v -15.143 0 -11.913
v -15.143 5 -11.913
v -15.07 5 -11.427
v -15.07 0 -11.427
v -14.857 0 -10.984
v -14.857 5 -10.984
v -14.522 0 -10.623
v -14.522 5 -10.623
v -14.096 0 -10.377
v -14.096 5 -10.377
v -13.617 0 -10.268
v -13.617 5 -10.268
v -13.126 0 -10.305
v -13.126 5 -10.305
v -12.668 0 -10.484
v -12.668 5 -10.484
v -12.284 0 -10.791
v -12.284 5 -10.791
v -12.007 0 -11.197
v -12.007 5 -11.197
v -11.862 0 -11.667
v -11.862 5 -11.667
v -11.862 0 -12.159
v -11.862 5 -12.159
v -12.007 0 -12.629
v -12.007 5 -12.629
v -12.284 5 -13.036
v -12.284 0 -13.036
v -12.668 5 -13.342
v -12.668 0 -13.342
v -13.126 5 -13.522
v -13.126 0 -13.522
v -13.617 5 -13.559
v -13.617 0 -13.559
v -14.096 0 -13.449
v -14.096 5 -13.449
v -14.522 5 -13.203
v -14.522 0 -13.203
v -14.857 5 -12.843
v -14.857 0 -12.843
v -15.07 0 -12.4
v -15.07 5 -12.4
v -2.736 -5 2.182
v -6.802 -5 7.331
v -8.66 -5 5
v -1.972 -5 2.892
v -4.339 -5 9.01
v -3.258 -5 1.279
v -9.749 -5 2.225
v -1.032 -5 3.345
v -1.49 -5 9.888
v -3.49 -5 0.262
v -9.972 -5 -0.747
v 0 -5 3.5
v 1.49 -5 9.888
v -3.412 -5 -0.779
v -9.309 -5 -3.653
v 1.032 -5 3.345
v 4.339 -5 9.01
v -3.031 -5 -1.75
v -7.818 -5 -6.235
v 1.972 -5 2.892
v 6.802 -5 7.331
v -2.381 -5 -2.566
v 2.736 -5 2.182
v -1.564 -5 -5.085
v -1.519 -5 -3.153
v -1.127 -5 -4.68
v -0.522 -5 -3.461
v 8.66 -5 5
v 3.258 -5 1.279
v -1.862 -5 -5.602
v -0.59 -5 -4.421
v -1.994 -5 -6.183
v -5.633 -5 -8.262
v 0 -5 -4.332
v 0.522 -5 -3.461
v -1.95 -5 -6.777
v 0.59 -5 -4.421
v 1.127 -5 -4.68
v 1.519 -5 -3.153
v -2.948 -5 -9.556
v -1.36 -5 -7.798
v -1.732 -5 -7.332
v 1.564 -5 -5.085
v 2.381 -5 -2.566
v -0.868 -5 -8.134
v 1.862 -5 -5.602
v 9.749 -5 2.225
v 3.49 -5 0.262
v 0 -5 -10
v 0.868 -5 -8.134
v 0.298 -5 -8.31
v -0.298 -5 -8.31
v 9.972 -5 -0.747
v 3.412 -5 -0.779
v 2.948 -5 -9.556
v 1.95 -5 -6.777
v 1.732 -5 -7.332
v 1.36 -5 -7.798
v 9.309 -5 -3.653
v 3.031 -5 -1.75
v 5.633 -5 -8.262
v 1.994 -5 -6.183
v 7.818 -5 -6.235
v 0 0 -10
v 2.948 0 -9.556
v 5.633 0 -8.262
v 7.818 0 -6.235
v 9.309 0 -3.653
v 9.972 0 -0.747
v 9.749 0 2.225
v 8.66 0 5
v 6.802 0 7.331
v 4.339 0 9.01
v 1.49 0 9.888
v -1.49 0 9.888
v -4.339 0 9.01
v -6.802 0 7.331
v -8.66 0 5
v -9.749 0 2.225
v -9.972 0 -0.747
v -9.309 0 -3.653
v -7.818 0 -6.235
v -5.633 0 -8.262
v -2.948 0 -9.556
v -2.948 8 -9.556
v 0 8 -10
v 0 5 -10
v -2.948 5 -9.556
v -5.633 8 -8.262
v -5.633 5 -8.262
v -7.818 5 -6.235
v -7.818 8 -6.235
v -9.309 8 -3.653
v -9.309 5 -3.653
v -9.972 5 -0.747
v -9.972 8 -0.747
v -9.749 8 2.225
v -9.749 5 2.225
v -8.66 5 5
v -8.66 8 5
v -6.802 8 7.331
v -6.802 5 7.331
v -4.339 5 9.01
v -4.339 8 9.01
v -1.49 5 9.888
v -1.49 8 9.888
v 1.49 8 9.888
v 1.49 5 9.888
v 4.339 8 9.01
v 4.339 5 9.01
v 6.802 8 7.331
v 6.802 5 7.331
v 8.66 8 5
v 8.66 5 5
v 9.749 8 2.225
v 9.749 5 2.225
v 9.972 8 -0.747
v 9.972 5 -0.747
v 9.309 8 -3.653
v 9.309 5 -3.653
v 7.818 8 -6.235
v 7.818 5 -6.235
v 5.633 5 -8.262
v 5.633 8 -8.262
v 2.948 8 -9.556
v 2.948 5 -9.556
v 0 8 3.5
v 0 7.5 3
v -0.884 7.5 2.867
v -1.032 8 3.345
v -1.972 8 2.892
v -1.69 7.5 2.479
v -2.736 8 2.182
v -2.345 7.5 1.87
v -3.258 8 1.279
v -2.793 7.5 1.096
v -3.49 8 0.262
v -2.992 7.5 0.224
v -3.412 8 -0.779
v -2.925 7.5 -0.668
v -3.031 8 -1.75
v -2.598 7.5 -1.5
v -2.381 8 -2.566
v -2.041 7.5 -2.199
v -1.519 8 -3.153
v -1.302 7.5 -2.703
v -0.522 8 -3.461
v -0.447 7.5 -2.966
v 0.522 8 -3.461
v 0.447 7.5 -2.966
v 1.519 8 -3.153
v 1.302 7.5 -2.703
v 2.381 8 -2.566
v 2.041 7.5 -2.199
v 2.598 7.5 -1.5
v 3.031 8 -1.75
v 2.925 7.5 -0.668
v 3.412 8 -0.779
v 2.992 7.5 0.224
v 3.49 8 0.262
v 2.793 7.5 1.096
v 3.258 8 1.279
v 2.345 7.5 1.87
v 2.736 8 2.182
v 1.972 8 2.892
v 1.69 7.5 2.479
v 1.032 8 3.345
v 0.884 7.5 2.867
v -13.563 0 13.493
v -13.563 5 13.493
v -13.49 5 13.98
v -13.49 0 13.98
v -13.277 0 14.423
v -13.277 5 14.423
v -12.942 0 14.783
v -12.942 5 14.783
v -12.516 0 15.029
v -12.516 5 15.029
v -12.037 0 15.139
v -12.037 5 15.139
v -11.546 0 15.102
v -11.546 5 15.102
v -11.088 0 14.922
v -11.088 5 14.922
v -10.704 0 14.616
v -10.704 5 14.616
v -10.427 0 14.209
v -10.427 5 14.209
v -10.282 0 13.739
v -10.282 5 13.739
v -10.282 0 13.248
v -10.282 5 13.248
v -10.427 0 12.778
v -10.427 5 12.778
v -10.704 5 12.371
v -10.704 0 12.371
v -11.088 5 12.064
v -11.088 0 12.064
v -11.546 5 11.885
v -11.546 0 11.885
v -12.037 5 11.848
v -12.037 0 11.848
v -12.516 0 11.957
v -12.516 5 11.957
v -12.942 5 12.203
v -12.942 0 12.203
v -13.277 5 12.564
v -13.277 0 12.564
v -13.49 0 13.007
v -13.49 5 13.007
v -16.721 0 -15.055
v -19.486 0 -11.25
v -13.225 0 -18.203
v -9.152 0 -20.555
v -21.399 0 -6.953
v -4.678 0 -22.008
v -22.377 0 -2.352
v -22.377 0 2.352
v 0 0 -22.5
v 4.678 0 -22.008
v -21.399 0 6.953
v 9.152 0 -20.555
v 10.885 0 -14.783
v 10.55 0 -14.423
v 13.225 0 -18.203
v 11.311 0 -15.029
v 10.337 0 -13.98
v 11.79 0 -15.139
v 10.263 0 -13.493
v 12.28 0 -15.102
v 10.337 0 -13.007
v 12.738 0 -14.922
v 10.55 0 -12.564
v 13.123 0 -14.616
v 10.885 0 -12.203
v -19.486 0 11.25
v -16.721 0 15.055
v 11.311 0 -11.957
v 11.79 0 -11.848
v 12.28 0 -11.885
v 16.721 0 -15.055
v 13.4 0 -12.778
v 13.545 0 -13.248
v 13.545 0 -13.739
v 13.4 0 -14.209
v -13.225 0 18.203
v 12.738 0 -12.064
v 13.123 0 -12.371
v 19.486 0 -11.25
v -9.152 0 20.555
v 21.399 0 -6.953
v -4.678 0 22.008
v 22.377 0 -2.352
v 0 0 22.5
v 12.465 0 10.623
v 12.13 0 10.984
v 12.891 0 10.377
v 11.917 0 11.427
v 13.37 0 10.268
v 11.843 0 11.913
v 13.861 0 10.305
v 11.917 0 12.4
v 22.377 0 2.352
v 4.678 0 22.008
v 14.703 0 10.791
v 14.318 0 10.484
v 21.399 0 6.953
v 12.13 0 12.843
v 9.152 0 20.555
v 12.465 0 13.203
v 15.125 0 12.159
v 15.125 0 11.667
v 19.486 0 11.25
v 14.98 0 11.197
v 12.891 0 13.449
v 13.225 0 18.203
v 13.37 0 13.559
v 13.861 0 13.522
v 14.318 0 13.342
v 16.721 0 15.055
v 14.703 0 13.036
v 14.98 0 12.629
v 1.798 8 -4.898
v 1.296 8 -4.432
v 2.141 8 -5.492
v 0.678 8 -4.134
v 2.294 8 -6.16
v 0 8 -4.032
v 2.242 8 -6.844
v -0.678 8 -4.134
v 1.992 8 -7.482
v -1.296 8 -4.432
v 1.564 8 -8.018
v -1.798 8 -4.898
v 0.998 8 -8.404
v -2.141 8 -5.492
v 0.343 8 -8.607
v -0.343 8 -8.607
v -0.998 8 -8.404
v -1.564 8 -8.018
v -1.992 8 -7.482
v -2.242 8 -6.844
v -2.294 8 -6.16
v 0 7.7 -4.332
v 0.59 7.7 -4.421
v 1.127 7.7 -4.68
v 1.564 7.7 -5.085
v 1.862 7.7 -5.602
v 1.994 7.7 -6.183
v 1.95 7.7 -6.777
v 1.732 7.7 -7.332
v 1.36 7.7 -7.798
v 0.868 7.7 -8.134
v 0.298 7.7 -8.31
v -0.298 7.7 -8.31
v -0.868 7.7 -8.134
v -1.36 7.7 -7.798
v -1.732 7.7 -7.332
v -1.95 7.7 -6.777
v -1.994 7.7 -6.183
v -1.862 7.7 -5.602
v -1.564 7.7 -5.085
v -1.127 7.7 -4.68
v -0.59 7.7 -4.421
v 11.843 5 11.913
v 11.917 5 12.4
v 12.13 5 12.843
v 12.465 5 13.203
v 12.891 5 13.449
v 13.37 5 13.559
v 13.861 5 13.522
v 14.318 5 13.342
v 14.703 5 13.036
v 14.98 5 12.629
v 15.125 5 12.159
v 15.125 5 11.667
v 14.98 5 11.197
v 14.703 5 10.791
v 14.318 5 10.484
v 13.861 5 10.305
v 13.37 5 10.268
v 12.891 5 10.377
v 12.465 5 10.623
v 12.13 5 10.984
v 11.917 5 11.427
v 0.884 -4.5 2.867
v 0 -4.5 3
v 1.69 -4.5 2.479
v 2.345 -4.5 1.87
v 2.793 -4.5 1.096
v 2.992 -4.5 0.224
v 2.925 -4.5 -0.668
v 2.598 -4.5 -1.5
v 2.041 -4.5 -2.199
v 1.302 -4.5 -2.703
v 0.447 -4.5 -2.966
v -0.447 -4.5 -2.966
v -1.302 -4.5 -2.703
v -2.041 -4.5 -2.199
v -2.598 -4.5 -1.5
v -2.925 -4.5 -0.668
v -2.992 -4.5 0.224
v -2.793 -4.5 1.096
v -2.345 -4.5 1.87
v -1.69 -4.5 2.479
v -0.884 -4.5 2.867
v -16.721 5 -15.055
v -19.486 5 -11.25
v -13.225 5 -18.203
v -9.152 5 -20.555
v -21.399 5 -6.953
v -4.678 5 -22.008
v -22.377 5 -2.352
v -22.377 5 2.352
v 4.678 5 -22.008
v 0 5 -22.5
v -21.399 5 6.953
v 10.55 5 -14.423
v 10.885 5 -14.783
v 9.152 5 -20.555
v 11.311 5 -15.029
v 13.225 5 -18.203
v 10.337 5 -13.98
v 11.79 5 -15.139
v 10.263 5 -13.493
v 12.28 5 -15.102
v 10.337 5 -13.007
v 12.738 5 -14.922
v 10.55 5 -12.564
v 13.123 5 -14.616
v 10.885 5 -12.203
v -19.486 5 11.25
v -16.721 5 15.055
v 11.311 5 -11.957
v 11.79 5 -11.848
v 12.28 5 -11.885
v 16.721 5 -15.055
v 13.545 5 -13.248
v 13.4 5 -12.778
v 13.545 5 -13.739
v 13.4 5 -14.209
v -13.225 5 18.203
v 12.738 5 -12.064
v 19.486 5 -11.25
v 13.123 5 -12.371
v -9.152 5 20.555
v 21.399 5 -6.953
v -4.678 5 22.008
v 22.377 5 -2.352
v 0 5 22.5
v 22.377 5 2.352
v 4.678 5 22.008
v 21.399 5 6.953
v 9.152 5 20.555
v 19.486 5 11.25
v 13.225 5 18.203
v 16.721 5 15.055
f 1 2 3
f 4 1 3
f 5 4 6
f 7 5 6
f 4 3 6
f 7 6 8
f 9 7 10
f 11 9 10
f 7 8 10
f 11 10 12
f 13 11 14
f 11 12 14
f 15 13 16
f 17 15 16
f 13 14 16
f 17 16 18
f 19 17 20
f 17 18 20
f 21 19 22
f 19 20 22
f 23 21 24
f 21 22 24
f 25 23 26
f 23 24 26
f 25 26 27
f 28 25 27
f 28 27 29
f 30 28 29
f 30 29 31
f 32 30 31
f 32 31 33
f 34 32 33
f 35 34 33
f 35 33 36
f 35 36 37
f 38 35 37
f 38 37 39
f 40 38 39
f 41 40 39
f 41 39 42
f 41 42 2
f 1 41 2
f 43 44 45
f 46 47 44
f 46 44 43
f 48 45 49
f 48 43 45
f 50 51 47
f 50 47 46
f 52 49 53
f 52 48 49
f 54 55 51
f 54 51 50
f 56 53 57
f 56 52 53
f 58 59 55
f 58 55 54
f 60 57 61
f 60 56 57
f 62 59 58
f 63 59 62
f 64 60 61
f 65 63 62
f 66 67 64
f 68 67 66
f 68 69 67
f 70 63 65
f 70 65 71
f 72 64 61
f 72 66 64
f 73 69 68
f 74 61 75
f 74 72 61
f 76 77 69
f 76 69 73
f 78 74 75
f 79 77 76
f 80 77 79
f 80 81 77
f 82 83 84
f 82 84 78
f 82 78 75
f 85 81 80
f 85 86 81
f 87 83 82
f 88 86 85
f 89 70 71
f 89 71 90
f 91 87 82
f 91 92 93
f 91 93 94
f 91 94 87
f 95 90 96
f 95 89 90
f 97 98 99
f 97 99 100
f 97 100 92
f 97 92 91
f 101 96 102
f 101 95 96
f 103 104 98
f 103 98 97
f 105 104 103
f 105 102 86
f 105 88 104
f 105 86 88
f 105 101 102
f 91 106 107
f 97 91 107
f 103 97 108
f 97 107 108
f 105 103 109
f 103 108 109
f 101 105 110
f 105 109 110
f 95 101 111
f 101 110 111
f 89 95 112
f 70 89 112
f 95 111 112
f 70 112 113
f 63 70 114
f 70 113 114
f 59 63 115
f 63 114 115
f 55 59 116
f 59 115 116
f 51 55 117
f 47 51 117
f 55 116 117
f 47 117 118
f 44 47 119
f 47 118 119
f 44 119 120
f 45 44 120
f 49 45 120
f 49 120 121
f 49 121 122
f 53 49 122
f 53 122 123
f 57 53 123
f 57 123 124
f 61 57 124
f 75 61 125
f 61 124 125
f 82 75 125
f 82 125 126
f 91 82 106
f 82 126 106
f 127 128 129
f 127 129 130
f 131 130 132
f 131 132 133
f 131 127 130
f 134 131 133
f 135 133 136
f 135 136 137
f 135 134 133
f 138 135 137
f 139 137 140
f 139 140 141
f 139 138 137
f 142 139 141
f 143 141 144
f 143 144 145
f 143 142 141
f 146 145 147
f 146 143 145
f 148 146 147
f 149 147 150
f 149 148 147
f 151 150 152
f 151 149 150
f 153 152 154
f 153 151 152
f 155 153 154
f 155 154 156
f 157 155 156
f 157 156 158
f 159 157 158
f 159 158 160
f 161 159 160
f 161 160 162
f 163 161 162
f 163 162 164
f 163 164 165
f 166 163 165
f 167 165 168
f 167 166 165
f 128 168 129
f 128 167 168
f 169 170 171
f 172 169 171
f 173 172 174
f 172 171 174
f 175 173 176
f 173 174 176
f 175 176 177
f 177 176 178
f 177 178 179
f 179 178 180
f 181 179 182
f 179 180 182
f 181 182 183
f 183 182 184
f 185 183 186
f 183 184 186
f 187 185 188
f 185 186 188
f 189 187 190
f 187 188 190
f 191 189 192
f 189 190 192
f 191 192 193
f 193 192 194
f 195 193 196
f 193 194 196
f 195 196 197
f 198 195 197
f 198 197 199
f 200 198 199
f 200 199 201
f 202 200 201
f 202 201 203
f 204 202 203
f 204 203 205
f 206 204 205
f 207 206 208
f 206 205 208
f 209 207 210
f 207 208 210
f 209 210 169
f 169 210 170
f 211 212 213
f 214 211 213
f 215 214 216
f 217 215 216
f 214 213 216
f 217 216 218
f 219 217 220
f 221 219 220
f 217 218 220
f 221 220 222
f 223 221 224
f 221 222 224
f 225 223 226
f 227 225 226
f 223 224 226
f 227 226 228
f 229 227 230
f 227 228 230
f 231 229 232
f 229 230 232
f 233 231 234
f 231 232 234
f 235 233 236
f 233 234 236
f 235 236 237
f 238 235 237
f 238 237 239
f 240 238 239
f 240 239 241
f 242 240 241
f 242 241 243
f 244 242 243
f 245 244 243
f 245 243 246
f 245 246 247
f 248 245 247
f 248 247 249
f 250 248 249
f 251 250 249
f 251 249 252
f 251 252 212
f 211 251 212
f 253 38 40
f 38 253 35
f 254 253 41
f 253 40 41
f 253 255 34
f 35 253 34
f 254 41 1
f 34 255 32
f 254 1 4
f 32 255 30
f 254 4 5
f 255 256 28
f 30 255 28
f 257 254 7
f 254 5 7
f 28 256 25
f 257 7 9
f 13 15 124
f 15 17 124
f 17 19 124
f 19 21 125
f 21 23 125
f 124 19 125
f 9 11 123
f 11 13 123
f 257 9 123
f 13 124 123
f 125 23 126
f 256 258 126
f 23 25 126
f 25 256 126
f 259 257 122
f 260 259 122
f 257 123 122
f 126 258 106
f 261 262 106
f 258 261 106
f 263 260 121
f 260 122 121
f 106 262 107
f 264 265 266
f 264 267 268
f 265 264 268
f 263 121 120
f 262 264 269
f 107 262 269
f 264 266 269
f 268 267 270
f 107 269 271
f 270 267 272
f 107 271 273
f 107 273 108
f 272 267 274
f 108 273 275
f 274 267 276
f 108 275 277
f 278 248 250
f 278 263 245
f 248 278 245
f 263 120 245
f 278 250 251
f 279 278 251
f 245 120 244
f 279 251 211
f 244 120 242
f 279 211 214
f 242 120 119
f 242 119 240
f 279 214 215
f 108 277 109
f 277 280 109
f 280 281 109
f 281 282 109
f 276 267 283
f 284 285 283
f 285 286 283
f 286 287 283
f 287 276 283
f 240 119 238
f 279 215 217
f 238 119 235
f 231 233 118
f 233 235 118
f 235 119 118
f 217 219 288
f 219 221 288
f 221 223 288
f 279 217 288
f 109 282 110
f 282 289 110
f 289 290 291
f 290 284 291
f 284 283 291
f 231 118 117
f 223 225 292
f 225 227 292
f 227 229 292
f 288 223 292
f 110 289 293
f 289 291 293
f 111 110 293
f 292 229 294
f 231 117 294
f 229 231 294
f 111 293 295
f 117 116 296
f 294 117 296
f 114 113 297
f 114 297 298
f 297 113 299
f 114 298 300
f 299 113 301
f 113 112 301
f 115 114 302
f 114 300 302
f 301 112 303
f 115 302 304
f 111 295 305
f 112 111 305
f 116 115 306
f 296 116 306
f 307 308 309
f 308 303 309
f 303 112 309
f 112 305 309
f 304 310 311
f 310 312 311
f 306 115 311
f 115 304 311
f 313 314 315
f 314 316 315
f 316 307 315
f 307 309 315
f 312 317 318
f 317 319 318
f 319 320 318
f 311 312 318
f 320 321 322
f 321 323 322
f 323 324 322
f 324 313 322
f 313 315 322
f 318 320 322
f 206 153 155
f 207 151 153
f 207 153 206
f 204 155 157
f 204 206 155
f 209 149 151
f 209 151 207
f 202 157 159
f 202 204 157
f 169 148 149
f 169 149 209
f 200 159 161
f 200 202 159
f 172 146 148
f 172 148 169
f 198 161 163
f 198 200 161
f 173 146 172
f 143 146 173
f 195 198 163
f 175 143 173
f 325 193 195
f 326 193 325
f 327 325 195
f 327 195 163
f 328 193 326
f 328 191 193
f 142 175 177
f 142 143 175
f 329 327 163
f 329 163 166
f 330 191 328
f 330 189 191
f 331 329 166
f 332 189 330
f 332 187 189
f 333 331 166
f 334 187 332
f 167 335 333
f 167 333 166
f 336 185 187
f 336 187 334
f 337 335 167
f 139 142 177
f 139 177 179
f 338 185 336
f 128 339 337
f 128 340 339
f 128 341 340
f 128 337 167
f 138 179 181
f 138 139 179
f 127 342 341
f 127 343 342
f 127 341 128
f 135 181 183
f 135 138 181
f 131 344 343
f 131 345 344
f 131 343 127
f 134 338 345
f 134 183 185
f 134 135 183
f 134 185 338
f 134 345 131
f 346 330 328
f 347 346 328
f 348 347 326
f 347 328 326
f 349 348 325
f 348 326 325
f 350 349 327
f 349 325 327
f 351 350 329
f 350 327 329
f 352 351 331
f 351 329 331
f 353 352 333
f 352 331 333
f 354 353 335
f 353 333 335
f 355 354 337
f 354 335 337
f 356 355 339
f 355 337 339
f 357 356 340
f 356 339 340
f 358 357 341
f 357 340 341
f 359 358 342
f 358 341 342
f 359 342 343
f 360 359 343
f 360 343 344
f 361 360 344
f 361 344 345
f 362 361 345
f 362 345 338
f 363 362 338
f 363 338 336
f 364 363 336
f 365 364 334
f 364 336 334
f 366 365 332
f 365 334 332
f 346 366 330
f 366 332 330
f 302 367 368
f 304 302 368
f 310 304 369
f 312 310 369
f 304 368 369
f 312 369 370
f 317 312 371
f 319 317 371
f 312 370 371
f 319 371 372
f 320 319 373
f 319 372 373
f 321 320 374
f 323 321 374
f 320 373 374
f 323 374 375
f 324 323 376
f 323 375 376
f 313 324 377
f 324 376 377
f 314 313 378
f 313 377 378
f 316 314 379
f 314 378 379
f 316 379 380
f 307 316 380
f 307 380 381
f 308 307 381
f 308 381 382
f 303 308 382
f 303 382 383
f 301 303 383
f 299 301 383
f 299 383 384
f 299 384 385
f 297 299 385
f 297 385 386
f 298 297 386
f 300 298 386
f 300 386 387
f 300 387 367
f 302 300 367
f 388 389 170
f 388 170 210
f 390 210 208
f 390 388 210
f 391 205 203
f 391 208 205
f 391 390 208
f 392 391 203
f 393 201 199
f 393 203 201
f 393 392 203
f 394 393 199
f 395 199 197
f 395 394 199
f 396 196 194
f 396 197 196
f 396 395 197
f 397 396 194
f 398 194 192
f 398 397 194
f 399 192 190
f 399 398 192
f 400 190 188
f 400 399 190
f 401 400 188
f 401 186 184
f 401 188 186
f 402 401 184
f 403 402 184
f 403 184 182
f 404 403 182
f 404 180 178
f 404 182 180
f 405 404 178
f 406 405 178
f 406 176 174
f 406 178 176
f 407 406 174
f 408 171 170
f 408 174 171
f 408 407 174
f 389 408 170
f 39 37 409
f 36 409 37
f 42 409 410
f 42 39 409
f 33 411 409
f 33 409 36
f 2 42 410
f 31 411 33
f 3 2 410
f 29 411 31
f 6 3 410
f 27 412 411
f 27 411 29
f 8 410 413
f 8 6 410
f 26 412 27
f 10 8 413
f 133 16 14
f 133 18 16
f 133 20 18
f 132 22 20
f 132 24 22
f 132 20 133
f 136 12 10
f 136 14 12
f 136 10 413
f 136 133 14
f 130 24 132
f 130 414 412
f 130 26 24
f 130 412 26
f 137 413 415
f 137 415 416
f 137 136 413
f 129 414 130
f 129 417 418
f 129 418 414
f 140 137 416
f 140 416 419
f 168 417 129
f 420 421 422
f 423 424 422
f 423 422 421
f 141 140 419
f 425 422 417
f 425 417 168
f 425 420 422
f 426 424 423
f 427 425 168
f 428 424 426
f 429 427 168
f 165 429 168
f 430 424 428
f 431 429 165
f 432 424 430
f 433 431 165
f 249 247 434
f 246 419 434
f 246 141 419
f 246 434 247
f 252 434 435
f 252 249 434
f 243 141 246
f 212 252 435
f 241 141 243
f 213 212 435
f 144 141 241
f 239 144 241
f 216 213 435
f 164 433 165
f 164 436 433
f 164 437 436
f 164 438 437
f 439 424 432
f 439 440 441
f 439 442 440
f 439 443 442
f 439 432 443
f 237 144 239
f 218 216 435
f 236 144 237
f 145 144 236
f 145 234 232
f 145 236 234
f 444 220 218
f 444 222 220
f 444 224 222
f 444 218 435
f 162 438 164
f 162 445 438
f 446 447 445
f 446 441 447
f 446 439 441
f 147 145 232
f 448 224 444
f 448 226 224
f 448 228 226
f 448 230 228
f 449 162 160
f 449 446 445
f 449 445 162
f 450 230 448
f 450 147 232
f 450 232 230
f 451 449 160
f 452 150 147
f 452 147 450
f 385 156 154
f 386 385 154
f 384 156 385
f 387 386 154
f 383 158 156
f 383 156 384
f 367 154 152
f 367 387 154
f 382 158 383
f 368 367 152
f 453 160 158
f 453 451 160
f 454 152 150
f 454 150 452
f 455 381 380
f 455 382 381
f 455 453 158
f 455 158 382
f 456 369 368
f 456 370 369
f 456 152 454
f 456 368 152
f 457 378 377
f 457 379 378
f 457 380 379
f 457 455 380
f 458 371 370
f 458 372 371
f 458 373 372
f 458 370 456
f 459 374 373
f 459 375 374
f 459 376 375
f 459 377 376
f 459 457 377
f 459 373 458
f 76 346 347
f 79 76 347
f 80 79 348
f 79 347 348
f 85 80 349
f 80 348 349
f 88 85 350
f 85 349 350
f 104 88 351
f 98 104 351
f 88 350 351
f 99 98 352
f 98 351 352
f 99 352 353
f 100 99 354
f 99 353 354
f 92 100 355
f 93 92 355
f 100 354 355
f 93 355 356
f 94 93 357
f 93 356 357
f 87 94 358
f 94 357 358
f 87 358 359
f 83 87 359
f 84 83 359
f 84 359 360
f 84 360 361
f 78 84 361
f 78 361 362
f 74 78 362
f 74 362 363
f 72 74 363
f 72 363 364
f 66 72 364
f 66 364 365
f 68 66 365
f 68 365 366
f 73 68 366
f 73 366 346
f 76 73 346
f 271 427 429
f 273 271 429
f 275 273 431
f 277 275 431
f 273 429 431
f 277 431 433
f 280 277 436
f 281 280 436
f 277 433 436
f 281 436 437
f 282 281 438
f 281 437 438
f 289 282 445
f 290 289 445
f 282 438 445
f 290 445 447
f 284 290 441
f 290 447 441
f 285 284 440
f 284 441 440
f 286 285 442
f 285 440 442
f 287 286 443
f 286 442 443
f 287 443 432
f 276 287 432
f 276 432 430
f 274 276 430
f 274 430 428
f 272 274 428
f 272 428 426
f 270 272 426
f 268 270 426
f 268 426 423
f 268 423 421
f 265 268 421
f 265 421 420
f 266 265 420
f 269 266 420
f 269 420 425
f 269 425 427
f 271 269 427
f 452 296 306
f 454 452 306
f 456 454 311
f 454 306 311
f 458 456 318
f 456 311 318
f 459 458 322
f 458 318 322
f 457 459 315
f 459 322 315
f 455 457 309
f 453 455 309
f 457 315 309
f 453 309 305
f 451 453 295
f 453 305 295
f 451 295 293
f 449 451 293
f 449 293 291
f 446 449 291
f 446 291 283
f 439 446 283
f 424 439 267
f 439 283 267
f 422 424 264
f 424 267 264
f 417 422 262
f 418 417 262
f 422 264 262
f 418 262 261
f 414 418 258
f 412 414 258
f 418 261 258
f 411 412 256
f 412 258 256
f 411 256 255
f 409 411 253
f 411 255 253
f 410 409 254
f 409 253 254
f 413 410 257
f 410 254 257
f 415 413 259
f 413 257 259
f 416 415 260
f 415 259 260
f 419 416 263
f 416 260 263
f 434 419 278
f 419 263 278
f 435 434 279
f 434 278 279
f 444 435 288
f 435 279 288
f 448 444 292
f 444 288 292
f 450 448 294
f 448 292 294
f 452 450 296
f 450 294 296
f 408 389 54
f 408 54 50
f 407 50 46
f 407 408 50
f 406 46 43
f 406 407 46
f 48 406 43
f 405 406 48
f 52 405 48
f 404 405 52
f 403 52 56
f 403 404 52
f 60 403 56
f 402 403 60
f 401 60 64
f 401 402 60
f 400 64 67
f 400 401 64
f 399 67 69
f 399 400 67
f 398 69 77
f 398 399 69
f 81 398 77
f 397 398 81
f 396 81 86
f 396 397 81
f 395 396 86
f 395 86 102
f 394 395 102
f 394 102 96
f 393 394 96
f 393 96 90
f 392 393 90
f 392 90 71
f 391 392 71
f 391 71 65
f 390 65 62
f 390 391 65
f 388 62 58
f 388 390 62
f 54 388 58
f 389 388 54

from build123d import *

# Parameters (mm, degrees)
SKETCH_1_R               = 22.5
EXTRUDE_1_DEPTH          = 5
SKETCH_2_R               = 10
EXTRUDE_2_DEPTH          = 5
EXTRUDE_START            = 3
SKETCH_4_R               = 10
EXTRUDE_3_DEPTH          = 3
CUT_EXTRUDE_2_DEPTH      = 35.372954485
CUT_EXTRUDE_2_DEPTH_BACK = 35.372954485
SKETCH_5_R               = 3
HOLE_WIZARD_M4_3_D       = 3.3
SKETCH_10_R              = 2
CUT_EXTRUDE_3_DEPTH      = 35.372954485
CHAMFER_2_SIZE           = 0.5
CHAMFER_4_SIZE           = 0.3


with BuildPart() as part:
    # 草图1 → 凸台-拉伸1 (new body)
    with BuildSketch(Plane(origin=(0, 0, 0), x_dir=(1, 0, 0), z_dir=(0, 1, 0))):
        Circle(SKETCH_1_R)
    extrude(amount=EXTRUDE_1_DEPTH)

    # 草图2 → 凸台-拉伸2 (add)
    with BuildSketch(Plane.XZ):
        Circle(SKETCH_2_R)
    extrude(amount=EXTRUDE_2_DEPTH)

    # 草图4 → 凸台-拉伸3 (add)
    with BuildSketch(Plane(origin=(0, 5, 0), x_dir=(1, 0, 0), z_dir=(0, 1, 0)).offset(EXTRUDE_START)):
        Circle(SKETCH_4_R)
    extrude(amount=-EXTRUDE_3_DEPTH)

    # 草图5 → 切除-拉伸2 (cut, two sides: drawn at the far end of the back side and taken through both)
    with BuildSketch(Plane(origin=(0, 8, 0), x_dir=(1, 0, 0), z_dir=(0, 1, 0)).offset(-CUT_EXTRUDE_2_DEPTH_BACK)):
        Circle(SKETCH_5_R)
    extrude(amount=CUT_EXTRUDE_2_DEPTH + CUT_EXTRUDE_2_DEPTH_BACK, mode=Mode.SUBTRACT)

    # M4 螺纹孔3 (through all)
    with Locations(Plane.XZ):
        with Locations((11.913336036, -13.493421527), (13.493421527, 11.913336036), (-11.913336036, 13.493421527), (-13.493421527, -11.913336036)):
            Hole(HOLE_WIZARD_M4_3_D / 2)

    # 草图10 → 切除-拉伸3 (cut, through all)
    with BuildSketch(Plane(origin=(0, 8, 0), x_dir=(1, 0, 0), z_dir=(0, 1, 0))):
        with Locations((0, 6.332219822)):
            Circle(SKETCH_10_R)
    extrude(amount=-CUT_EXTRUDE_3_DEPTH, mode=Mode.SUBTRACT)

    # 倒角2
    chamfer_2_edges = [part.edges().sort_by_distance(p)[0] for p in [
        (-3, -5, 0),
        (-3, 8, 0),
    ]]
    chamfer(chamfer_2_edges, length=CHAMFER_2_SIZE)

    # 倒角4
    chamfer_4_edges = [part.edges().sort_by_distance(p)[0] for p in [
        (-2, 8, -6.332219822),
    ]]
    chamfer(chamfer_4_edges, length=CHAMFER_4_SIZE)


solid = part.part
